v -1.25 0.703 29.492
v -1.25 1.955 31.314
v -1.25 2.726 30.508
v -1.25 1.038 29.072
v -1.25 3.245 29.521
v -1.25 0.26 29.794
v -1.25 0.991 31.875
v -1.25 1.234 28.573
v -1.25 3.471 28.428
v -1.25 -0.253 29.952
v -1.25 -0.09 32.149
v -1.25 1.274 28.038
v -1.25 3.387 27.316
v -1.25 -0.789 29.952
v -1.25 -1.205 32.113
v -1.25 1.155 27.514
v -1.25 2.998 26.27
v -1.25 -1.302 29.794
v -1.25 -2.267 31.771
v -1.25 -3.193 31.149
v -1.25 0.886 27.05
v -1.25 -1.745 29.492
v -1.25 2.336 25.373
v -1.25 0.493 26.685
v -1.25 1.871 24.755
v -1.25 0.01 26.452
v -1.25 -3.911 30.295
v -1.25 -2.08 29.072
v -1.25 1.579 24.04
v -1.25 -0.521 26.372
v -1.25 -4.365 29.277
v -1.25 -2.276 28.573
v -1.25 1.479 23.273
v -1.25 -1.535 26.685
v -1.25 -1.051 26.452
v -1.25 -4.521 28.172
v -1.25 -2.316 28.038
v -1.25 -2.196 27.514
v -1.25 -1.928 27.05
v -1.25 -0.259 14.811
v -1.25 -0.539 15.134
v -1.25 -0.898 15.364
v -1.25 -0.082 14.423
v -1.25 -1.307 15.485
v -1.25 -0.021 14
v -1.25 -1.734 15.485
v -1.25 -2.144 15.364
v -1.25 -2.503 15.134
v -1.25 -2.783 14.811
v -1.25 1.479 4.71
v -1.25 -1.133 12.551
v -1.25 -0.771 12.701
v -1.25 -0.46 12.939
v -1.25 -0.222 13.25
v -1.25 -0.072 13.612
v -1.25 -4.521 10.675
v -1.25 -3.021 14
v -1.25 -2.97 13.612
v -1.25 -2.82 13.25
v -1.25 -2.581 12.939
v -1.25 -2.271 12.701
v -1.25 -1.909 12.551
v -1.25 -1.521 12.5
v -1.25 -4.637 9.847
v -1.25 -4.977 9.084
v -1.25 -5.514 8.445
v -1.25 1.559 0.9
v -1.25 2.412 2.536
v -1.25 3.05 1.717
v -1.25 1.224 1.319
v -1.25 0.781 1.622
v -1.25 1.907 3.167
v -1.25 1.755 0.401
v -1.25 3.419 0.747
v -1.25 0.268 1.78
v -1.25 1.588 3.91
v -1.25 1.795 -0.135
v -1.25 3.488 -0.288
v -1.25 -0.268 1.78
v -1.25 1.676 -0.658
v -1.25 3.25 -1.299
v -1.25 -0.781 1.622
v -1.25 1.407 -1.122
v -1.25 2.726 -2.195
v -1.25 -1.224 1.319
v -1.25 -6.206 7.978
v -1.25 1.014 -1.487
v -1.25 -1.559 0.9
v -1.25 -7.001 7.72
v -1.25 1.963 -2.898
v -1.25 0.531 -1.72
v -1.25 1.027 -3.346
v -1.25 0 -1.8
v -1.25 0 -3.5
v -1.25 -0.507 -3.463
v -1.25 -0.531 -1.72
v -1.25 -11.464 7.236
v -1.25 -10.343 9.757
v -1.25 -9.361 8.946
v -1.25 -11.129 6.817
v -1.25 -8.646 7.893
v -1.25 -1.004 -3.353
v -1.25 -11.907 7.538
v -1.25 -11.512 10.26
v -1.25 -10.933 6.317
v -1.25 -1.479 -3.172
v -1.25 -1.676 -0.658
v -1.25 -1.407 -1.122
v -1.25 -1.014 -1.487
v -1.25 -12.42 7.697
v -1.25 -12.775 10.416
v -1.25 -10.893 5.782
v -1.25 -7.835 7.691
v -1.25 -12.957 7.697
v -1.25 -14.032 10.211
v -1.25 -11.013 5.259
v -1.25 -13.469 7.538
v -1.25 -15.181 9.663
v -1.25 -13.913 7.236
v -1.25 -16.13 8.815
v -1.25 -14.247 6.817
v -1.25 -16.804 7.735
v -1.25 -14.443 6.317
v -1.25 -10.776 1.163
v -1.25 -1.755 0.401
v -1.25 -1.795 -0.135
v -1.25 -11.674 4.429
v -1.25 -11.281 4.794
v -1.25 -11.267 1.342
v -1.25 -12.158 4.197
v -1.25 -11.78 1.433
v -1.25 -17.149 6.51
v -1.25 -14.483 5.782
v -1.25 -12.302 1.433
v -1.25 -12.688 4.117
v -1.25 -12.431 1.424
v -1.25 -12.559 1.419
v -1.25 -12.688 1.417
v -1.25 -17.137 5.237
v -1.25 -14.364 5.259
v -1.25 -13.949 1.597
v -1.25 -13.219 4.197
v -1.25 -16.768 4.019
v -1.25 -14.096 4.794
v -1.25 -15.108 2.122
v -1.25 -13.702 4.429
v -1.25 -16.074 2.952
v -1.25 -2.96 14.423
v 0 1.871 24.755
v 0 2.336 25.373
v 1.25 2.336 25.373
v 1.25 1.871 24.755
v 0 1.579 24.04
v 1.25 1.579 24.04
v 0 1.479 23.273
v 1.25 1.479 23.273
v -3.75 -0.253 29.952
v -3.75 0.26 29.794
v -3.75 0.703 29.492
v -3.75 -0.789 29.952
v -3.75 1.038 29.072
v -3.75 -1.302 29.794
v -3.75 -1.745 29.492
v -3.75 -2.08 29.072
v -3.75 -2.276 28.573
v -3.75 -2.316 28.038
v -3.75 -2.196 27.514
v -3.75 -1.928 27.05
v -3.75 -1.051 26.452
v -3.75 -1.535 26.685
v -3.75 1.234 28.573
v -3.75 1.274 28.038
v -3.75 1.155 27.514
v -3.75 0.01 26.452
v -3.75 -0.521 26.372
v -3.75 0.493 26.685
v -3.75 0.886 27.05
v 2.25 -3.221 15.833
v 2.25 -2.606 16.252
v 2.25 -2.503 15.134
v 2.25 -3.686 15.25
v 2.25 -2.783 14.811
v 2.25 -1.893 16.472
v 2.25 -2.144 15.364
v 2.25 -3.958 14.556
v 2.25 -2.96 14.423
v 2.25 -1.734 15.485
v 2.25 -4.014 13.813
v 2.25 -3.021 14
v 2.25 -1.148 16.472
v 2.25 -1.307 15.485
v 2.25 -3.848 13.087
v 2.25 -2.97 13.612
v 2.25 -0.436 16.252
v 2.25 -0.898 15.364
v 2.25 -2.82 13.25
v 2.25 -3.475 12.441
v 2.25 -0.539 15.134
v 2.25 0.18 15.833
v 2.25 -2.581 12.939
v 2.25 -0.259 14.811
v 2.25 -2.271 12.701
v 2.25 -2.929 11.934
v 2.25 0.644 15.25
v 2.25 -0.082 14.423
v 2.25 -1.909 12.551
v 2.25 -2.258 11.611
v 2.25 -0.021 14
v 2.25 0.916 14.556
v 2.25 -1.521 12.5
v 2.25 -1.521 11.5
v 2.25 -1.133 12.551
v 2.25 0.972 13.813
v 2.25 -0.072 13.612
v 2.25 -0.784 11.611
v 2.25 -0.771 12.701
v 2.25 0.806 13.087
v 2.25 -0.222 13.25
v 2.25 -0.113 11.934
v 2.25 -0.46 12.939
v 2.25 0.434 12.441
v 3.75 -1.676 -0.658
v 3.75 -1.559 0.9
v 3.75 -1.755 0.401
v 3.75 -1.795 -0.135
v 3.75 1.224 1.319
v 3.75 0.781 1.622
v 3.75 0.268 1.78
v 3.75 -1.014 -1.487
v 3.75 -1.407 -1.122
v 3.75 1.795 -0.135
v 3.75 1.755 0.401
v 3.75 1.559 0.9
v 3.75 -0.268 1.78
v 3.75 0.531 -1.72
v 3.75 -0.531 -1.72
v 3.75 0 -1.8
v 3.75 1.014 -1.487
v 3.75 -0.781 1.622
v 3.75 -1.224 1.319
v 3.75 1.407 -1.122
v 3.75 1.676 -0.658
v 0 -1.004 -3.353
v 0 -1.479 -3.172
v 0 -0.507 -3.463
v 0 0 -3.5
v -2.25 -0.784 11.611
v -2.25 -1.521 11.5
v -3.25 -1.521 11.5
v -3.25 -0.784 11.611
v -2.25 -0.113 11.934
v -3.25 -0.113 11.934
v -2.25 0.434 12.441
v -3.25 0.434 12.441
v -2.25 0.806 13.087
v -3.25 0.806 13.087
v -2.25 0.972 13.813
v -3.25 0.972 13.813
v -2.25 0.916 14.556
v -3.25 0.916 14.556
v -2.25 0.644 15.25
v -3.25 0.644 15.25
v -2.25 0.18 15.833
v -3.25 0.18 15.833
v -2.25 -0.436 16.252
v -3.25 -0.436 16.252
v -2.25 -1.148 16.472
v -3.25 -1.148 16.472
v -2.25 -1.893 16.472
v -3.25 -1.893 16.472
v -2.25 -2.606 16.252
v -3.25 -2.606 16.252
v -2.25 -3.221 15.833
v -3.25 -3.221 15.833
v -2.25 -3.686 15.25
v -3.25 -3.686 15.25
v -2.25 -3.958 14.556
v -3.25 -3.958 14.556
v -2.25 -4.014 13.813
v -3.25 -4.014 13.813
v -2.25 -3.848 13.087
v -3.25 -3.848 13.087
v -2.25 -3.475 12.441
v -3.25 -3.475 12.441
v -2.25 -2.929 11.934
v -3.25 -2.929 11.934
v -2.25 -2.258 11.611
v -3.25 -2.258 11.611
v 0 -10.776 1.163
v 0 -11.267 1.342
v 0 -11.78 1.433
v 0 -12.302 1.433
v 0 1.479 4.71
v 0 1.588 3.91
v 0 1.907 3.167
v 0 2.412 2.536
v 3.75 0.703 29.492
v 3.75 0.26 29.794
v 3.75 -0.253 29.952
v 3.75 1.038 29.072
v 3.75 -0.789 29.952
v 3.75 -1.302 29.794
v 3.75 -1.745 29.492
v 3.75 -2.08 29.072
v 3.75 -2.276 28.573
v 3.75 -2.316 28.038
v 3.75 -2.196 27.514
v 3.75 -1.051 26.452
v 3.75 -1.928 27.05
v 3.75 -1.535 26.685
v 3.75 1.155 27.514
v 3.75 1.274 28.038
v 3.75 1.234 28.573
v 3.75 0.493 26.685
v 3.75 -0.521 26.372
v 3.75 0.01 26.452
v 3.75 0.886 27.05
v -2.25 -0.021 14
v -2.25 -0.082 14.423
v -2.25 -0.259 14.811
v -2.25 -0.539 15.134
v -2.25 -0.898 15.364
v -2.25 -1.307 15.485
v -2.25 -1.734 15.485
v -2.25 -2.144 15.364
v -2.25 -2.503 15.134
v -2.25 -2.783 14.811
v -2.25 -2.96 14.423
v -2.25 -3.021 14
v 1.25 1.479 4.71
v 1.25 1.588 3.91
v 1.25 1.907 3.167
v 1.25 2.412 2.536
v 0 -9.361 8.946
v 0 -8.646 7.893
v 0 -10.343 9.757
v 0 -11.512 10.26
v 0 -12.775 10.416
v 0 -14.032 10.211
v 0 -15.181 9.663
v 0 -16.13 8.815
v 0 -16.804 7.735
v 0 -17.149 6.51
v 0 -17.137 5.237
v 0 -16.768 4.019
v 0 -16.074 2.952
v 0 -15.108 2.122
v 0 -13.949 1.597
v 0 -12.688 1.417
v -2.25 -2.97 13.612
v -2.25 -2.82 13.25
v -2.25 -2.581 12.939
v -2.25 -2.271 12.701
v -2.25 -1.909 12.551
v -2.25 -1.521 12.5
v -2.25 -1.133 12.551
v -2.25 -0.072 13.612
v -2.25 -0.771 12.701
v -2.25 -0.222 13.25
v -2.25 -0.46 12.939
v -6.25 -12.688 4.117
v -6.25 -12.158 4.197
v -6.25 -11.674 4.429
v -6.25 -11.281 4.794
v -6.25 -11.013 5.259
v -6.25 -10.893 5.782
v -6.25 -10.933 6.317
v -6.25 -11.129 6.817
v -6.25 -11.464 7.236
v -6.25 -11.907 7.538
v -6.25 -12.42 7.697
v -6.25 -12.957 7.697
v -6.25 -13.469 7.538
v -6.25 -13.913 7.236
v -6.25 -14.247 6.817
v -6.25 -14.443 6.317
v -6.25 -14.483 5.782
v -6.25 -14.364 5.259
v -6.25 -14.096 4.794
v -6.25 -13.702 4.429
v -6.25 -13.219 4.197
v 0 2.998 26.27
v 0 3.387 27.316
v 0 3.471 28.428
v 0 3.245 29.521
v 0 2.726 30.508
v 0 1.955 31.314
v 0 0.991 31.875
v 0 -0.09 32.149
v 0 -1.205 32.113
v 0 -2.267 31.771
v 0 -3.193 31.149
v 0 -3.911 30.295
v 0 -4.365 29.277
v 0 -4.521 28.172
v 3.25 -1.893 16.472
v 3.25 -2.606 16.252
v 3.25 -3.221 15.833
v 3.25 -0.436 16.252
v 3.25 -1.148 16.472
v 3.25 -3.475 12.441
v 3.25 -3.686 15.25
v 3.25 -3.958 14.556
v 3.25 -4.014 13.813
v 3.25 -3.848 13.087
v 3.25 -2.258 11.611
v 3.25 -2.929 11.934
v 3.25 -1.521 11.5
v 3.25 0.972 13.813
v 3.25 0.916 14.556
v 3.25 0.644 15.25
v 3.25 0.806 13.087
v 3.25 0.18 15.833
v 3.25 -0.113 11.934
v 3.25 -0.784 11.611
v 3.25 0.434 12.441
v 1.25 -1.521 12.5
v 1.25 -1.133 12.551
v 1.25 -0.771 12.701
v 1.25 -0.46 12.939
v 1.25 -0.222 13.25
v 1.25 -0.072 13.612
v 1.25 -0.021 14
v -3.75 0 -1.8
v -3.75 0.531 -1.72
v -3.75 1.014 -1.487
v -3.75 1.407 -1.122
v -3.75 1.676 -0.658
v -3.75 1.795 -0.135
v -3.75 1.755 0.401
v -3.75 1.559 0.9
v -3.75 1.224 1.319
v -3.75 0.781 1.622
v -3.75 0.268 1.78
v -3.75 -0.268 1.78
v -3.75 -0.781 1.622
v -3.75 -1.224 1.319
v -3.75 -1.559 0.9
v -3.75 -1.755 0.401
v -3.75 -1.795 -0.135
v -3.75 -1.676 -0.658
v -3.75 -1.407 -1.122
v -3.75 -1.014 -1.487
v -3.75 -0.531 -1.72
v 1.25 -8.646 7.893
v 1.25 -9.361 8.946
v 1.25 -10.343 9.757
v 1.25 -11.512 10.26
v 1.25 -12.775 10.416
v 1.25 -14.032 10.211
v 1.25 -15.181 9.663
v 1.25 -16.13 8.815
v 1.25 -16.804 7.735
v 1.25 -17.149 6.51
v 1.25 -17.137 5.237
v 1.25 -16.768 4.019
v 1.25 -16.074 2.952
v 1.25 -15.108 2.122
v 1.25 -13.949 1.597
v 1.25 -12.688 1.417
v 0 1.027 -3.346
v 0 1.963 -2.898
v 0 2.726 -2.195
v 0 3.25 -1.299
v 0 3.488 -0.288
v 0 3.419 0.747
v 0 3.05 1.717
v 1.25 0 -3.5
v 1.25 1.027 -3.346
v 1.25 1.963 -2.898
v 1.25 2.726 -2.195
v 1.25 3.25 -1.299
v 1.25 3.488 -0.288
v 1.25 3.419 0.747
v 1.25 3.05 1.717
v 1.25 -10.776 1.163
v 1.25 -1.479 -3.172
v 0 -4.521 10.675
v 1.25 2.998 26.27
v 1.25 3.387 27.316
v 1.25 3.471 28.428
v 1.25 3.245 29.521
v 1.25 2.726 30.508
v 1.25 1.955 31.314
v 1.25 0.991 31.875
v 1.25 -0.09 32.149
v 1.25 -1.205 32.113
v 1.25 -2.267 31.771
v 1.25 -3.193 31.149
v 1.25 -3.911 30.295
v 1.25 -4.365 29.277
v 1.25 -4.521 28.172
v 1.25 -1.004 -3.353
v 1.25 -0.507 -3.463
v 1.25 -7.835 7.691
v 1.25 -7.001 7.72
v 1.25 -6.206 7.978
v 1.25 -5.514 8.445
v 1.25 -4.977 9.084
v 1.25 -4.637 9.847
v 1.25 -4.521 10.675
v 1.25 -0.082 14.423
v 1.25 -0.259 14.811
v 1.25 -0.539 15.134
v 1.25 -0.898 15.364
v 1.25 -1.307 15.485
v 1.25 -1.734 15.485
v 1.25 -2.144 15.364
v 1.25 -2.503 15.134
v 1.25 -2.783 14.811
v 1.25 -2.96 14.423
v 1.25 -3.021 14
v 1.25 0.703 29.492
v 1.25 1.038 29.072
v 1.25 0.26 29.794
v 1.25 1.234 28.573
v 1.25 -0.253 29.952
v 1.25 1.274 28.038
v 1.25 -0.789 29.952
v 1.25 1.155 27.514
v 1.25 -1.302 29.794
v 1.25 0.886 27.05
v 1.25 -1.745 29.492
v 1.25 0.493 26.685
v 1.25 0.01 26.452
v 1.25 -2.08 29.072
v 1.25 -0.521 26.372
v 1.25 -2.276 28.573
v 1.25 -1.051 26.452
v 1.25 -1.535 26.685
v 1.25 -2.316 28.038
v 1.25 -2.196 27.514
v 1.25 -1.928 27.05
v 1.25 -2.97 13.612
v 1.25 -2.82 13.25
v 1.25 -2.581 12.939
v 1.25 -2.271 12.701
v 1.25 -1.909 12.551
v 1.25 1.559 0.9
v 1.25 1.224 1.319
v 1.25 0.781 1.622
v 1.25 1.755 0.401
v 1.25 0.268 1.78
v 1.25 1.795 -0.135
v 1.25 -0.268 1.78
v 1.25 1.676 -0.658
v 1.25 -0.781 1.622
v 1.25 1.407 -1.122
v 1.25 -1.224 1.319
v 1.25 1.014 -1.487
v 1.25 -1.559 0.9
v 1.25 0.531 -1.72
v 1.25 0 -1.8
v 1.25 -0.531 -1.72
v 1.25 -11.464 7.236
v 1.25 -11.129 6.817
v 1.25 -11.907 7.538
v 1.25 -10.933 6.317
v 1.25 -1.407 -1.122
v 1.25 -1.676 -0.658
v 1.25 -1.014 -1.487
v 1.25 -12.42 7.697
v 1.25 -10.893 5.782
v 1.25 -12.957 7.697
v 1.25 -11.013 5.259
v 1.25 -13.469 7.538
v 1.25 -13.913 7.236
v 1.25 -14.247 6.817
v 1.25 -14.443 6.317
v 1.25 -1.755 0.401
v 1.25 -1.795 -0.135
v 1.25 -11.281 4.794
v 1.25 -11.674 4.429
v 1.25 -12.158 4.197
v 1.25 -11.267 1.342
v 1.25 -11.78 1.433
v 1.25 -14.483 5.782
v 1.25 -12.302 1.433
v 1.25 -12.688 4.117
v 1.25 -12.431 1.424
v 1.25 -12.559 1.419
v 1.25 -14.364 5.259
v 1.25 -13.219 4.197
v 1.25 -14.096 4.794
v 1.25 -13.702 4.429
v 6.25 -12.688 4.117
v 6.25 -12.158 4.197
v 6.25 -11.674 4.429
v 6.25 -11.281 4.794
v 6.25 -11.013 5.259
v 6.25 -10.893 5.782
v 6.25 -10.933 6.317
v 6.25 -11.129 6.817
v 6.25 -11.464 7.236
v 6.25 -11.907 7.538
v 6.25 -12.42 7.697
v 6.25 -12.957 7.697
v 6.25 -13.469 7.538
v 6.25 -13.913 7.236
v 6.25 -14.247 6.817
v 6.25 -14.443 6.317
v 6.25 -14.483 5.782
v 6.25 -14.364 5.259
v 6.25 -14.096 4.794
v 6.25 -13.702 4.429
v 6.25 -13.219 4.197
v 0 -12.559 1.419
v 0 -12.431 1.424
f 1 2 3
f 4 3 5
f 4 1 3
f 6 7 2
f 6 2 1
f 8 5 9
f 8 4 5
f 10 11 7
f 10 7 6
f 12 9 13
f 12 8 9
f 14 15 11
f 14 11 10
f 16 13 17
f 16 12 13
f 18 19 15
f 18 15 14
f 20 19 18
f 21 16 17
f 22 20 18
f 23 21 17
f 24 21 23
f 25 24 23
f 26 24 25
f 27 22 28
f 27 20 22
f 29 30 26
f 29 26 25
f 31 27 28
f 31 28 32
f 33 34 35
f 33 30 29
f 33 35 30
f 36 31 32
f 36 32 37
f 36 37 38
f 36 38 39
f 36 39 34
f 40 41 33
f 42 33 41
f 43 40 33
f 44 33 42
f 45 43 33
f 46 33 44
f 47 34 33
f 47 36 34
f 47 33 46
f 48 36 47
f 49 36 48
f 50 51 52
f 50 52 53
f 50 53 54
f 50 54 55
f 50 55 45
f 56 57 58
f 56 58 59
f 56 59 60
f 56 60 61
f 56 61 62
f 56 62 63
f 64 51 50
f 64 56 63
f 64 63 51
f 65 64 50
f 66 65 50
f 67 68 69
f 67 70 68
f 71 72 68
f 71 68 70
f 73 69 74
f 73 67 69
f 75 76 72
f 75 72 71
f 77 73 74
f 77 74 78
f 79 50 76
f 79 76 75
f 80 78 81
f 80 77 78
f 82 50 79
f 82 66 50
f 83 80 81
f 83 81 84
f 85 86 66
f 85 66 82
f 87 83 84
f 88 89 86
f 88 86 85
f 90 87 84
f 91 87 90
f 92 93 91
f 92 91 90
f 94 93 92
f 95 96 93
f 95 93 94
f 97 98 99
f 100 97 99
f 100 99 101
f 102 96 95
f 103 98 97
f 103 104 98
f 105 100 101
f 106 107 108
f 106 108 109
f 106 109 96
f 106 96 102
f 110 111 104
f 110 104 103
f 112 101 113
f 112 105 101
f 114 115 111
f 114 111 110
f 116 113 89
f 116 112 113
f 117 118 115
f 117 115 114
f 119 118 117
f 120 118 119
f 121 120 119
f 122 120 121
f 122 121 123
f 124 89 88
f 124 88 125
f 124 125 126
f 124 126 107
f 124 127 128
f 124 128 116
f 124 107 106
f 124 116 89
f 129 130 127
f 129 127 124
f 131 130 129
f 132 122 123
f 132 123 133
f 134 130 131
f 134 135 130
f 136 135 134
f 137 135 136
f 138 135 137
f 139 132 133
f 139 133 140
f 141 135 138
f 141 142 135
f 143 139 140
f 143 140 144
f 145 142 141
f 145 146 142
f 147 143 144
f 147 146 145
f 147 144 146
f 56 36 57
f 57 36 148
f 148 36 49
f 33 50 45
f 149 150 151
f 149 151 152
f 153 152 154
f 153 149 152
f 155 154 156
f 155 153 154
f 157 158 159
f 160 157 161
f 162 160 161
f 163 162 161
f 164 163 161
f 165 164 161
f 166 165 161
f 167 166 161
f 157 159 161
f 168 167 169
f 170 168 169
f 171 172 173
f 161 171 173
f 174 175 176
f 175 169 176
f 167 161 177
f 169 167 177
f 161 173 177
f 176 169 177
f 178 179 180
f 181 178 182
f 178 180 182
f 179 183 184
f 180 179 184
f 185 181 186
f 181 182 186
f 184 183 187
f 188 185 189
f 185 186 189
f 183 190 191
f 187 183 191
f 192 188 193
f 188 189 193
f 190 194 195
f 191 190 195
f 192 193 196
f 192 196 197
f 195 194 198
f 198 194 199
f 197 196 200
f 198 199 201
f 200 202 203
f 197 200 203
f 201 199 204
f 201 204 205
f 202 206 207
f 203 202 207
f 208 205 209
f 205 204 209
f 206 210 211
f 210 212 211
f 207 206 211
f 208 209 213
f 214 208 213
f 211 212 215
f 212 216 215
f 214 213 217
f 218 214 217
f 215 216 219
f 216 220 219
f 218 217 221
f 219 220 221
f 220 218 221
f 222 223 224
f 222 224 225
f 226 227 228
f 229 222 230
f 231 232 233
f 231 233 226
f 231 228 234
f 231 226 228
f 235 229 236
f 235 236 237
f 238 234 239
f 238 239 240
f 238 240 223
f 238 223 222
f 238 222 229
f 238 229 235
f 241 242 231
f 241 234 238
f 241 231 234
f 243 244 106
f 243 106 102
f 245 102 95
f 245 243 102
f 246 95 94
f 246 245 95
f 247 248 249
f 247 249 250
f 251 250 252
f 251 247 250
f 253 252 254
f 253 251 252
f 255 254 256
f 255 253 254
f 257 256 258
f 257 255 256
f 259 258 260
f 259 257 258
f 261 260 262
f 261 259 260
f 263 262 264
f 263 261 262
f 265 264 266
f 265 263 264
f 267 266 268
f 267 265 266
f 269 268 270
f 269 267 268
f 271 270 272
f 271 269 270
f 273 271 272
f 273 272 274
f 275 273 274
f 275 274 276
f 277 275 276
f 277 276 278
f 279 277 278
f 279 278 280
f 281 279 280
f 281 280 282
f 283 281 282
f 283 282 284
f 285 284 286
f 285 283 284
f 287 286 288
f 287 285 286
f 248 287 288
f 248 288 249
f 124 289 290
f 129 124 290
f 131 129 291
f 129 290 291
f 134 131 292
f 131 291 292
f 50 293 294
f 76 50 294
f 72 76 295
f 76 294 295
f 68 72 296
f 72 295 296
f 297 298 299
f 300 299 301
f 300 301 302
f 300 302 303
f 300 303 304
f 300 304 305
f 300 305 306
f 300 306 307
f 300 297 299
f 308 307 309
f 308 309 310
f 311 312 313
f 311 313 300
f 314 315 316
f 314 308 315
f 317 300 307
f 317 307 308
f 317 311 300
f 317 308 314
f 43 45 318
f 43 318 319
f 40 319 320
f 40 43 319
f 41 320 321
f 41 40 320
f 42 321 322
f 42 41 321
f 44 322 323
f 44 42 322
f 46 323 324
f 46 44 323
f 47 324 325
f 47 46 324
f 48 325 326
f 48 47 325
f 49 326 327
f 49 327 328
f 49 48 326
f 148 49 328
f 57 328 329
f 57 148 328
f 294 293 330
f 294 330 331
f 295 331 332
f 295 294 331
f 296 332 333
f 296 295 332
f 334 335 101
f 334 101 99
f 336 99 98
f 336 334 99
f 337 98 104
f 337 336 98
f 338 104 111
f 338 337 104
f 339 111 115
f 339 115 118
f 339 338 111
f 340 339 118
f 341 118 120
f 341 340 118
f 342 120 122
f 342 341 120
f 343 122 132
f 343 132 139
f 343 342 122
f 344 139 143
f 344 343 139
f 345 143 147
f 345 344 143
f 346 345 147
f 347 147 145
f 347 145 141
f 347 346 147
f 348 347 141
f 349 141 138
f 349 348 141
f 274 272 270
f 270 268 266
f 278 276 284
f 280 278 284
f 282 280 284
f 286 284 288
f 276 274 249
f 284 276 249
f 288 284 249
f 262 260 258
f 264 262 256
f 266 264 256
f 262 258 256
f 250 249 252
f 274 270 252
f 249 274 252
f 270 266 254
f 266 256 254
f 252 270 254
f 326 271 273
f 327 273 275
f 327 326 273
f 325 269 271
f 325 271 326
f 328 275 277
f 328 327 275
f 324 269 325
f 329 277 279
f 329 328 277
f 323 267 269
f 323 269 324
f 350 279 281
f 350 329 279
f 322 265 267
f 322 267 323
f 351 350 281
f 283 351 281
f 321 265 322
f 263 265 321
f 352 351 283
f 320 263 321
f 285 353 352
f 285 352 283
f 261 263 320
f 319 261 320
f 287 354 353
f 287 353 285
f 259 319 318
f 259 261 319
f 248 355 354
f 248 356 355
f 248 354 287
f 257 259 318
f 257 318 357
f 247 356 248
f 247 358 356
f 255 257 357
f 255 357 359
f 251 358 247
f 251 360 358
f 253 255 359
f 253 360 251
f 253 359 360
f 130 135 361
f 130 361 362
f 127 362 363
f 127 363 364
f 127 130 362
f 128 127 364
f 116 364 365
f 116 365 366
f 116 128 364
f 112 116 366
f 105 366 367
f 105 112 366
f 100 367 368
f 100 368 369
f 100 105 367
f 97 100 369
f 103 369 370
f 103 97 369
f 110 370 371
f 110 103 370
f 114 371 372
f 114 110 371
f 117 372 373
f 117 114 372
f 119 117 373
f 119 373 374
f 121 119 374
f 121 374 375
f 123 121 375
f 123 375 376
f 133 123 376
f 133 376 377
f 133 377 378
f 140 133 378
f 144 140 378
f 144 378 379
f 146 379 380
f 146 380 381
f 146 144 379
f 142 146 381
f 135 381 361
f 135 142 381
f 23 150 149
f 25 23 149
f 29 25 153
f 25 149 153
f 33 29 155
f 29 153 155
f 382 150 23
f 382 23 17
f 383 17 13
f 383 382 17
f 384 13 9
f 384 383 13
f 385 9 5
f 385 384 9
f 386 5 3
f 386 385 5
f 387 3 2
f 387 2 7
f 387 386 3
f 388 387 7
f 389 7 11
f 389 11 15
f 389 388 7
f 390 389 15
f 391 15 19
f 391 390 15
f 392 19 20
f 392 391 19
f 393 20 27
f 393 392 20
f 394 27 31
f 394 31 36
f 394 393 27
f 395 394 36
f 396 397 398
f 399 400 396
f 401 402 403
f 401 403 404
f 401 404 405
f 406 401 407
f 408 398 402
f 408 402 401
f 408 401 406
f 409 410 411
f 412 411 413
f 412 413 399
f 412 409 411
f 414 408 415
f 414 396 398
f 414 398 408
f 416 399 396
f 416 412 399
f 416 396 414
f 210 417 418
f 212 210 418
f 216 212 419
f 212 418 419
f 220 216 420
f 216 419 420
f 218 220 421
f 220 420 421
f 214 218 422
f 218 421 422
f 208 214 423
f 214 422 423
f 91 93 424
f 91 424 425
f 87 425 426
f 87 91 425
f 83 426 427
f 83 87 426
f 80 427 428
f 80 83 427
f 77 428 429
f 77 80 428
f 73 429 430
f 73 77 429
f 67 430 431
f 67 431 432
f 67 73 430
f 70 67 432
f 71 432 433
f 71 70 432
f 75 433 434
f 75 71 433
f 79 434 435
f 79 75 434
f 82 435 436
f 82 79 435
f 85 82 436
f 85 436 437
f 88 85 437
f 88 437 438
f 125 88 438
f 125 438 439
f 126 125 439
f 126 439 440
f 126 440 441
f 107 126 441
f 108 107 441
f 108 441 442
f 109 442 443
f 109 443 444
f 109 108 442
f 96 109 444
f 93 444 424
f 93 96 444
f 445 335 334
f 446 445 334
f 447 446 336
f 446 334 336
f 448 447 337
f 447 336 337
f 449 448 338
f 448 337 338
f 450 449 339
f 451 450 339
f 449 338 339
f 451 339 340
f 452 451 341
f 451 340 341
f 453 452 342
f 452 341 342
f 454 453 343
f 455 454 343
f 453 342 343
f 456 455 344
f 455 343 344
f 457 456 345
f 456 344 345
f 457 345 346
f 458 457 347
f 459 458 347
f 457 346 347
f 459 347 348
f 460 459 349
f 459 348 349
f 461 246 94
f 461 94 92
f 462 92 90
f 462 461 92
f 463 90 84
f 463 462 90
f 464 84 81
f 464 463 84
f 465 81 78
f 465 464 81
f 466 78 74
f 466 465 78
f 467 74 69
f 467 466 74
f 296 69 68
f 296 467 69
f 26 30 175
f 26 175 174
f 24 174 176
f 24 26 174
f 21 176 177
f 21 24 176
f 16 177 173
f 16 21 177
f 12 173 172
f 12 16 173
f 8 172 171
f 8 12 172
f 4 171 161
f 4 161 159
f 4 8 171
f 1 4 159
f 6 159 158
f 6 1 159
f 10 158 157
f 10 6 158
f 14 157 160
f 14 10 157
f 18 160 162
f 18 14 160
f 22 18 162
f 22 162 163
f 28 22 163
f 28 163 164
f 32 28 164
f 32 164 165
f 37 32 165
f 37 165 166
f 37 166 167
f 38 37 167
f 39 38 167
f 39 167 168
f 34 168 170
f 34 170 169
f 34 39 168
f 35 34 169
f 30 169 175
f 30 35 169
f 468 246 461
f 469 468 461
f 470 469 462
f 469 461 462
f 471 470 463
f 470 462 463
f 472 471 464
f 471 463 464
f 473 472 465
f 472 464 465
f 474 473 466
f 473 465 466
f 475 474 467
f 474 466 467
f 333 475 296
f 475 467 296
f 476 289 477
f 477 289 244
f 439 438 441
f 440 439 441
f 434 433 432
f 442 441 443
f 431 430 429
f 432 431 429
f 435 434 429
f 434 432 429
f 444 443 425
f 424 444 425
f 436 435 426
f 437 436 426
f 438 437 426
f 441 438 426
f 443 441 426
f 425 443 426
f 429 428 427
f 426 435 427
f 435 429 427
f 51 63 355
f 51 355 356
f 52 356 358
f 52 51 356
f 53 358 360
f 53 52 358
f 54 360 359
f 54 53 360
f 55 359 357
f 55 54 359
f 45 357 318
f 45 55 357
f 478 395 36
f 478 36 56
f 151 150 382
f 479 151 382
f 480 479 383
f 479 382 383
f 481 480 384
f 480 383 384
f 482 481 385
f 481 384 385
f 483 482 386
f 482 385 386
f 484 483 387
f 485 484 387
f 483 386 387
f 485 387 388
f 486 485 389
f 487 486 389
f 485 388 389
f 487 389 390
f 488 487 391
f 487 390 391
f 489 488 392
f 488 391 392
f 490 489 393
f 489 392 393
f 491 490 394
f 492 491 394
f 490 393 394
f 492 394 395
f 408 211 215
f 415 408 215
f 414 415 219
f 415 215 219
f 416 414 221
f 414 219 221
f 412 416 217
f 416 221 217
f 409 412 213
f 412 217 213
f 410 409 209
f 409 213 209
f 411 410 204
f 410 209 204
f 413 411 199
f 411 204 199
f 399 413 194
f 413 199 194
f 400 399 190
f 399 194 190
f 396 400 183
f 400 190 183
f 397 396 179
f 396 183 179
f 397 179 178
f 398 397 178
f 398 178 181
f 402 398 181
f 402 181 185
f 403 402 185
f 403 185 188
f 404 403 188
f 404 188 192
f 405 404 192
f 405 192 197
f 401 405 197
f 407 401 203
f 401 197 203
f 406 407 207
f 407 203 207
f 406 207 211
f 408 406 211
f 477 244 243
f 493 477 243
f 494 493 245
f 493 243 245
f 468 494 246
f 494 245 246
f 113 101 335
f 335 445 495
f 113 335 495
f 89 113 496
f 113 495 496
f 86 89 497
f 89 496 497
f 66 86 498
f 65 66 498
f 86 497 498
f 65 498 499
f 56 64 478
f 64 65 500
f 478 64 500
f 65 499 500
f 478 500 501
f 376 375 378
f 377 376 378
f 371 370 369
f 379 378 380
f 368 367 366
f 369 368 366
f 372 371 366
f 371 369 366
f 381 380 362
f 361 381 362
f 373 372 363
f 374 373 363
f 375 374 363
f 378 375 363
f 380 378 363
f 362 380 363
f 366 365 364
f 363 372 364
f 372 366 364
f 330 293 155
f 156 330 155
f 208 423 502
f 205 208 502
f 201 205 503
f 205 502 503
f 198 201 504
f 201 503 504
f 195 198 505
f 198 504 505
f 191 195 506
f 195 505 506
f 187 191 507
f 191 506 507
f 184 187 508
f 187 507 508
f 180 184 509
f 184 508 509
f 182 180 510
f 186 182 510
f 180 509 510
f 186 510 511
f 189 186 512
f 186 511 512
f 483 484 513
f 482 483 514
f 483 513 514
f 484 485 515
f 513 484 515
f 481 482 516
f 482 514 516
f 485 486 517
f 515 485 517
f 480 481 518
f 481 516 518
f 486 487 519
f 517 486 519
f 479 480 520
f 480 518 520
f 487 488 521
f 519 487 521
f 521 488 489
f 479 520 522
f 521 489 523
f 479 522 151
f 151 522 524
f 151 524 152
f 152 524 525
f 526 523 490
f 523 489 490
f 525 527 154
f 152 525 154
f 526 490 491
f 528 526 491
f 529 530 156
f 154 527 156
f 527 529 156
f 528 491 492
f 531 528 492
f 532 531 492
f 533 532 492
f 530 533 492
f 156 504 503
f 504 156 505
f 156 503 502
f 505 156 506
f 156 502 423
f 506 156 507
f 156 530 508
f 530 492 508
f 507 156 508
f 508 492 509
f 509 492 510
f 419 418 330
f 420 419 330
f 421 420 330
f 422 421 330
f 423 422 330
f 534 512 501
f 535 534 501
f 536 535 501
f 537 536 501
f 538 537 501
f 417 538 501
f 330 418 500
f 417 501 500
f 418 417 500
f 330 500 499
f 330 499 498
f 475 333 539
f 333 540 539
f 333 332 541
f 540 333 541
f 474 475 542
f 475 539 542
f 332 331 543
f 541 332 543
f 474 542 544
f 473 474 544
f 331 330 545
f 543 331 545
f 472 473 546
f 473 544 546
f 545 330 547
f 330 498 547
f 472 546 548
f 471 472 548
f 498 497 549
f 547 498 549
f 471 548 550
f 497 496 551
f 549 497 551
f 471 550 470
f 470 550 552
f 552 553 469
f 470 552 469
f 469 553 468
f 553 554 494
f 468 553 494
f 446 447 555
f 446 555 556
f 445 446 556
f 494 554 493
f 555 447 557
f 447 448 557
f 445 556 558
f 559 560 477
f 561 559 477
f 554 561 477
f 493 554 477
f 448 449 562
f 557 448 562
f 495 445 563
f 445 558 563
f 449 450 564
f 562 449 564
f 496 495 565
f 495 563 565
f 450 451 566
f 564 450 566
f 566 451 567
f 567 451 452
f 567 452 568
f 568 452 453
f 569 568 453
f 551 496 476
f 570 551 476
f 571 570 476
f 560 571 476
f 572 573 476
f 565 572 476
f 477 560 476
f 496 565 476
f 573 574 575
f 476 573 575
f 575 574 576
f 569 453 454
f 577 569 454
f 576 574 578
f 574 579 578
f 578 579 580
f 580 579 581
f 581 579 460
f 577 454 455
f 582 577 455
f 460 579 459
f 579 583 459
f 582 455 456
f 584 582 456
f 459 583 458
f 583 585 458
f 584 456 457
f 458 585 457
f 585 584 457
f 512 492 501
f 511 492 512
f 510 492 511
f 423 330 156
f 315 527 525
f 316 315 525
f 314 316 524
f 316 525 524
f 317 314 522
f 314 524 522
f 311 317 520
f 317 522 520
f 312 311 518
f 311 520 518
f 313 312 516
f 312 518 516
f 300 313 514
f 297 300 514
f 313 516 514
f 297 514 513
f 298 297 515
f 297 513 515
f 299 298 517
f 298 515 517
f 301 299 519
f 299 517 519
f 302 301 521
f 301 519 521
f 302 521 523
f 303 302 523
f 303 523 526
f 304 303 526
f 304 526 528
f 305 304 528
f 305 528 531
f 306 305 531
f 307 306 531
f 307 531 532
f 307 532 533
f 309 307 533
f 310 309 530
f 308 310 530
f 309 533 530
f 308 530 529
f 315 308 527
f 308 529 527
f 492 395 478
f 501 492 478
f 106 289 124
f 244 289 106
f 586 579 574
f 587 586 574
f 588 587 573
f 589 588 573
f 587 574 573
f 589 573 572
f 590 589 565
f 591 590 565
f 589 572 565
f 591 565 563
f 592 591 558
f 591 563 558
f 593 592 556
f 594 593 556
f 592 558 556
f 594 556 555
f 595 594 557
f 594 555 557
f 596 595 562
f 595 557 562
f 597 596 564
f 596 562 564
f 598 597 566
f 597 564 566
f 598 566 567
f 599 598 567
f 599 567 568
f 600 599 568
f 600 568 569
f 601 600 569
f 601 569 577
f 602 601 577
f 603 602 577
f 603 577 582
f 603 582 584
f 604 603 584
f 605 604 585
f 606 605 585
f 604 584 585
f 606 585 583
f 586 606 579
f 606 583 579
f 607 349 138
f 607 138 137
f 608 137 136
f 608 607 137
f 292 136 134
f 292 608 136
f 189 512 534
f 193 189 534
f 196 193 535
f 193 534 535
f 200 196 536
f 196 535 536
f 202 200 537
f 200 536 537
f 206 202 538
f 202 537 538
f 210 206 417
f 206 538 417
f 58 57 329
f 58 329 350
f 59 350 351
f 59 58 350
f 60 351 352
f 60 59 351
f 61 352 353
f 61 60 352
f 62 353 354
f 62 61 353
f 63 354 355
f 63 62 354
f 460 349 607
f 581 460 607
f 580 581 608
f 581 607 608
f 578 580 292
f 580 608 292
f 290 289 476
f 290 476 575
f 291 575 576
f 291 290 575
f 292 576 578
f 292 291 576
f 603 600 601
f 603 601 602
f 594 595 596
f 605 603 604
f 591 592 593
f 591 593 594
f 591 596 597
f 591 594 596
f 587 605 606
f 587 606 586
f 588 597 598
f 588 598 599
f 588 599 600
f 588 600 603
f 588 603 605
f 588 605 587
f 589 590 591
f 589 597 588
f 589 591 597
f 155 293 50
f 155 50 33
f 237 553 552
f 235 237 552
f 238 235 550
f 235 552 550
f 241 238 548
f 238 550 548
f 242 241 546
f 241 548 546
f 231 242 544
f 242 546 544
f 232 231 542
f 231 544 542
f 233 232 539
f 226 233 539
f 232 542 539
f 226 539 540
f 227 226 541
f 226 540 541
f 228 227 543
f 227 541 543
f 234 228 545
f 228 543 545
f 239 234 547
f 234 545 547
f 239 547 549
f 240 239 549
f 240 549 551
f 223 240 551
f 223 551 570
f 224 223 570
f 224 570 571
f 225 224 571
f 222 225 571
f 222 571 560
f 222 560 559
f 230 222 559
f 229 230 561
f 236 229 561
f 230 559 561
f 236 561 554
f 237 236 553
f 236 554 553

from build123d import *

# Parameters (mm, degrees)
EXTRUDE_1_DEPTH     = 1.25
SKETCH_1_3_R        = 2
CUT_EXTRUDE_1_DEPTH = 37.497164572
FILLET_1_R          = 3
EXTRUDE_START       = -1.25
SKETCH_2_R          = 2
EXTRUDE_2_DEPTH     = 1.25
SKETCH_2_5_R        = 1.8
EXTRUDE_5_DEPTH     = 2.5
SKETCH_2_7_R        = 1.8
EXTRUDE_7_DEPTH     = 5
EXTRUDE_8_DEPTH     = 1
EXTRUDE_START_2     = 1
SKETCH_3_3_R        = 2.5
EXTRUDE_9_DEPTH     = 1


with BuildPart() as part:
    # 草图1 → 凸台-拉伸1 (new body)
    with BuildSketch(Plane(origin=(0, 0, 0), x_dir=(0, 0, -1), z_dir=(1, 0, 0))):
        with BuildLine():
            Line((-28.172077255, -4.520836084), (-28.172077255, 1.479163916))
            Line((-28.172077255, 1.479163916), (-24.707975639, 1.479163916))
            ThreePointArc((-24.707975639, 1.479163916), (-31.63617887, 1.479163916), (-28.172077255, -4.520836084))
        make_face()
        with BuildLine():
            Line((-24.707975639, 1.479163916), (-28.172077255, 1.479163916))
            Line((-28.172077255, 1.479163916), (-28.172077255, -4.520836084))
            ThreePointArc((-28.172077255, -4.520836084), (-25.34365013, -3.349263209), (-24.172077255, -0.520836084))
            ThreePointArc((-24.172077255, -0.520836084), (-24.308373949, 0.514440097), (-24.707975639, 1.479163916))
        make_face()
        with BuildLine():
            Line((-3.172077255, 1.479163916), (-24.707975639, 1.479163916))
            ThreePointArc((-24.707975639, 1.479163916), (-24.308373949, 0.514440097), (-24.172077255, -0.520836084))
            ThreePointArc((-24.172077255, -0.520836084), (-25.34365013, -3.349263209), (-28.172077255, -4.520836084))
            Line((-28.172077255, -4.520836084), (-5.969923204, -4.520836084))
            Line((-5.969923204, -4.520836084), (-3.172077255, 1.479163916))
        make_face()
        with BuildLine():
            Line((3.172077255, -1.479163916), (-3.172077255, 1.479163916))
            Line((-3.172077255, 1.479163916), (-3.172077255, -1.479163916))
            ThreePointArc((-3.172077255, -1.479163916), (0, -3.5), (3.172077255, -1.479163916))
        make_face()
        with BuildLine():
            ThreePointArc((3.5, 0), (0.757538649, 3.417036025), (-3.172077255, 1.479163916))
            Line((-3.172077255, 1.479163916), (3.172077255, -1.479163916))
            ThreePointArc((3.172077255, -1.479163916), (3.417036025, -0.757538649), (3.5, 0))
        make_face()
        with BuildLine():
            ThreePointArc((-3.172077255, -1.479163916), (-3.5, 0), (-3.172077255, 1.479163916))
            Line((-3.172077255, 1.479163916), (-5.969923204, -4.520836084))
            Line((-5.969923204, -4.520836084), (-3.172077255, -4.520836084))
            Line((-3.172077255, -4.520836084), (-3.172077255, -1.479163916))
        make_face()
        with BuildLine():
            Line((-3.172077255, -1.479163916), (-3.172077255, 1.479163916))
            ThreePointArc((-3.172077255, 1.479163916), (-3.5, 0), (-3.172077255, -1.479163916))
        make_face()
        with BuildLine():
            Line((-3.172077255, -4.520836084), (-5.969923204, -4.520836084))
            Line((-5.969923204, -4.520836084), (-7.893387964, -8.645719574))
            ThreePointArc((-7.893387964, -8.645719574), (-4.014873487, -8.609923977), (-1.549233455, -11.604047406))
            Line((-1.549233455, -11.604047406), (3.172077255, -1.479163916))
            ThreePointArc((3.172077255, -1.479163916), (0, -3.5), (-3.172077255, -1.479163916))
            Line((-3.172077255, -1.479163916), (-3.172077255, -4.520836084))
        make_face()
        with BuildLine():
            ThreePointArc((-1.549233455, -11.604047406), (-4.014873487, -8.609923977), (-7.893387964, -8.645719574))
            Line((-7.893387964, -8.645719574), (-9.088732919, -11.209145102))
            Line((-9.088732919, -11.209145102), (-2.74457841, -14.167472935))
            Line((-2.74457841, -14.167472935), (-1.549233455, -11.604047406))
        make_face()
        with BuildLine():
            Line((-9.088732919, -11.209145102), (-7.893387964, -8.645719574))
            ThreePointArc((-7.893387964, -8.645719574), (-8.299375187, -16.50572276), (-1.416655664, -12.688309019))
            ThreePointArc((-1.416655664, -12.688309019), (-1.449923081, -12.14214052), (-1.549233455, -11.604047406))
            Line((-1.549233455, -11.604047406), (-2.74457841, -14.167472935))
            Line((-2.74457841, -14.167472935), (-9.088732919, -11.209145102))
        make_face()
    extrude(amount=EXTRUDE_1_DEPTH)

    # 草图1<3> → 切除-拉伸1 (cut, through all)
    with BuildSketch(Plane(origin=(0, 0, 0), x_dir=(0, 0, -1), z_dir=(1, 0, 0))):
        with Locations((-28.172077255, -0.520836084)):
            Circle(SKETCH_1_3_R)
        Circle(SKETCH_1_3_R)
        with Locations((-5.916655664, -12.688309019)):
            Circle(SKETCH_1_3_R)
    extrude(amount=CUT_EXTRUDE_1_DEPTH, mode=Mode.SUBTRACT)

    # 圆角1
    # the kernel refuses this fillet: 3 mm, written as the material it adds along each edge
    with BuildSketch(Plane(origin=(0, -11.604047406, 1.549233455), x_dir=(0, 0.9063077870366663, -0.4226182617406644), z_dir=(1, 0, 0))) as fillet_1_piece_1:
        with BuildLine():
            CenterArc((0.913230262, -3), FILLET_1_R, 90, 29.926434867)
            Line((-0.583432693, -0.4), (-0.613365952, -0.348))
            ThreePointArc((-0.613365952, -0.348), (-0.317772106, -0.161995545), (-0.037712362, 0.046666667))
            Line((-0.037712362, 0.046666667), (0, 0.06))
            Line((0, 0.06), (0.913230262, 0.06))
            Line((0.913230262, 0.06), (0.913230262, 0))
        make_face()
    extrude(amount=1.25)
    with BuildSketch(Plane(origin=(0, 1.479163916, 3.172077255), x_dir=(0, 0, 1), z_dir=(1, 0, 0))) as fillet_1_piece_2:
        with BuildLine():
            CenterArc((1.538240209, -3), FILLET_1_R, 90, 46.440922497)
            Line((-0.635752466, -0.932693577), (-0.67923232, -0.891347449))
            ThreePointArc((-0.67923232, -0.891347449), (-0.329607023, -0.458350724), (-0.054378467, 0.025357096))
            Line((-0.054378467, 0.025357096), (0, 0.06))
            Line((0, 0.06), (1.538240209, 0.06))
            Line((1.538240209, 0.06), (1.538240209, 0))
        make_face()
    extrude(amount=1.25)
    with BuildSketch(Plane(origin=(0, 1.479163916, 24.707975639), x_dir=(0, 0.7902368852402469, 0.6128014892326821), z_dir=(1, 0, 0))) as fillet_1_piece_3:
        with BuildLine():
            CenterArc((1.49141536, -2.972297887), FILLET_1_R, 97.792345701, 44.415308597)
            Line((-0.879295296, -1.133893419), (-0.926709509, -1.09712533))
            Line((-0.926709509, -1.09712533), (-0.047414213, 0.036768089))
            Line((-0.047414213, 0.036768089), (0.008134993, 0.059445958))
            ThreePointArc((0.008134993, 0.059445958), (0.542332858, 0.023063849), (1.076530723, 0.059445958))
            Line((1.076530723, 0.059445958), (1.084665716, 0))
        make_face()
    extrude(amount=1.25)
    with BuildSketch(Plane(origin=(0, -4.520836084, 5.969923204), x_dir=(0, 0, 1), z_dir=(1, 0, 0))) as fillet_1_piece_4:
        with BuildLine():
            CenterArc((4.704586321, 3), FILLET_1_R, 157.978087479, 112.021912521)
            Line((1.923464761, 4.12488349), (1.867842329, 4.14738116))
            ThreePointArc((1.867842329, 4.14738116), (0.907353913, 2.087798841), (-0.054378467, 0.025357096))
            Line((-0.054378467, 0.025357096), (0, -0.06))
            Line((0, -0.06), (4.704586321, -0.06))
            Line((4.704586321, -0.06), (4.704586321, 0))
        make_face()
    extrude(amount=1.25)

    # 草图2 → 凸台-拉伸2 (add)
    with BuildSketch(Plane(origin=(1.25, 0, 0), x_dir=(0, 0, -1), z_dir=(1, 0, 0)).offset(EXTRUDE_START)):
        Circle(SKETCH_2_R)
        with Locations((-5.916655664, -12.688309019)):
            Circle(SKETCH_2_R)
        with Locations((-28.172077255, -0.520836084)):
            Circle(SKETCH_2_R)
    extrude(amount=EXTRUDE_2_DEPTH)

    # 草图2<5> → 凸台-拉伸5 (add)
    with BuildSketch(Plane(origin=(1.25, 0, 0), x_dir=(0, 0, -1), z_dir=(1, 0, 0))):
        with Locations((-28.172077255, -0.520836084)):
            Circle(SKETCH_2_5_R)
        Circle(SKETCH_2_5_R)
    extrude(amount=EXTRUDE_5_DEPTH)

    # 草图2<7> → 凸台-拉伸7 (add)
    with BuildSketch(Plane(origin=(1.25, 0, 0), x_dir=(0, 0, -1), z_dir=(1, 0, 0))):
        with Locations((-5.916655664, -12.688309019)):
            Circle(SKETCH_2_7_R)
    extrude(amount=EXTRUDE_7_DEPTH)

    # 草图3 → 凸台-拉伸8 (add)
    with BuildSketch(Plane(origin=(1.25, 0, 0), x_dir=(0, 0, -1), z_dir=(1, 0, 0))):
        with BuildLine():
            ThreePointArc((-12.5, -1.520836084), (-12.939339828, -0.460175912), (-14, -0.020836084))
            Line((-14, -0.020836084), (-14, -3.020836084))
            ThreePointArc((-14, -3.020836084), (-12.939339828, -2.581496256), (-12.5, -1.520836084))
        make_face()
        with BuildLine():
            Line((-14, -3.020836084), (-14, -0.020836084))
            ThreePointArc((-14, -0.020836084), (-15.5, -1.520836084), (-14, -3.020836084))
        make_face()
    extrude(amount=EXTRUDE_8_DEPTH)

    # 草图3<3> → 凸台-拉伸9 (add)
    with BuildSketch(Plane(origin=(1.25, 0, 0), x_dir=(0, 0, -1), z_dir=(1, 0, 0)).offset(EXTRUDE_START_2)):
        with Locations((-14, -1.520836084)):
            Circle(SKETCH_3_3_R)
    extrude(amount=EXTRUDE_9_DEPTH)

    # 镜向1: part across plane


with BuildPart() as part_1:
    add(part.part)
    add(part.part.mirror(Plane.ZY))


solid = part_1.part
